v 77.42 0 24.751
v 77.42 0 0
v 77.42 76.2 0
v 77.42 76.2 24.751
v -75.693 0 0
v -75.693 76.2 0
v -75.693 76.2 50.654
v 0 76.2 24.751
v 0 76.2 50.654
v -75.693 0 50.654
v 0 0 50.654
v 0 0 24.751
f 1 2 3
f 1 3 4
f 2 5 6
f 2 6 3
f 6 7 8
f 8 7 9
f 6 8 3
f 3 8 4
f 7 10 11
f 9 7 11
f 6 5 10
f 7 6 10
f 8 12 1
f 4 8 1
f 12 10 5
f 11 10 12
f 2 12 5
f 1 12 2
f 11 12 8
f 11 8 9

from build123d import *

# Parameters (mm, degrees)
F0_W     = 76.2685239315
F0_H     = 25.6147123873
F1_DEPTH = 76.2
F3_W     = 153.1126648188
F3_H     = 50.6538152695
F4_DEPTH = 76.2
F5_W     = 77.4197503924
F5_H     = 25.9025208652
F6_DEPTH = 76.2


with BuildPart() as f1:
    # F0 (on Front) → F1 (new body)
    with BuildSketch(Plane.XZ):
        with Locations((38.1342619658, 12.8073561937)):
            Rectangle(F0_W, F0_H)
    extrude(amount=F1_DEPTH)


with BuildPart() as f4:
    # F3 (on Front) → F4 (new body)
    with BuildSketch(Plane.XZ):
        with Locations((0.8634179831, 25.3269076347)):
            Rectangle(F3_W, F3_H)
    extrude(amount=-F4_DEPTH)

    # F5 (on face) → F6 (cut, through all)
    with BuildSketch(Plane.XZ):
        with Locations((38.7098751962, 37.7025548369)):
            Rectangle(F5_W, F5_H)
    extrude(amount=-F6_DEPTH, mode=Mode.SUBTRACT)


solid = f4.part
